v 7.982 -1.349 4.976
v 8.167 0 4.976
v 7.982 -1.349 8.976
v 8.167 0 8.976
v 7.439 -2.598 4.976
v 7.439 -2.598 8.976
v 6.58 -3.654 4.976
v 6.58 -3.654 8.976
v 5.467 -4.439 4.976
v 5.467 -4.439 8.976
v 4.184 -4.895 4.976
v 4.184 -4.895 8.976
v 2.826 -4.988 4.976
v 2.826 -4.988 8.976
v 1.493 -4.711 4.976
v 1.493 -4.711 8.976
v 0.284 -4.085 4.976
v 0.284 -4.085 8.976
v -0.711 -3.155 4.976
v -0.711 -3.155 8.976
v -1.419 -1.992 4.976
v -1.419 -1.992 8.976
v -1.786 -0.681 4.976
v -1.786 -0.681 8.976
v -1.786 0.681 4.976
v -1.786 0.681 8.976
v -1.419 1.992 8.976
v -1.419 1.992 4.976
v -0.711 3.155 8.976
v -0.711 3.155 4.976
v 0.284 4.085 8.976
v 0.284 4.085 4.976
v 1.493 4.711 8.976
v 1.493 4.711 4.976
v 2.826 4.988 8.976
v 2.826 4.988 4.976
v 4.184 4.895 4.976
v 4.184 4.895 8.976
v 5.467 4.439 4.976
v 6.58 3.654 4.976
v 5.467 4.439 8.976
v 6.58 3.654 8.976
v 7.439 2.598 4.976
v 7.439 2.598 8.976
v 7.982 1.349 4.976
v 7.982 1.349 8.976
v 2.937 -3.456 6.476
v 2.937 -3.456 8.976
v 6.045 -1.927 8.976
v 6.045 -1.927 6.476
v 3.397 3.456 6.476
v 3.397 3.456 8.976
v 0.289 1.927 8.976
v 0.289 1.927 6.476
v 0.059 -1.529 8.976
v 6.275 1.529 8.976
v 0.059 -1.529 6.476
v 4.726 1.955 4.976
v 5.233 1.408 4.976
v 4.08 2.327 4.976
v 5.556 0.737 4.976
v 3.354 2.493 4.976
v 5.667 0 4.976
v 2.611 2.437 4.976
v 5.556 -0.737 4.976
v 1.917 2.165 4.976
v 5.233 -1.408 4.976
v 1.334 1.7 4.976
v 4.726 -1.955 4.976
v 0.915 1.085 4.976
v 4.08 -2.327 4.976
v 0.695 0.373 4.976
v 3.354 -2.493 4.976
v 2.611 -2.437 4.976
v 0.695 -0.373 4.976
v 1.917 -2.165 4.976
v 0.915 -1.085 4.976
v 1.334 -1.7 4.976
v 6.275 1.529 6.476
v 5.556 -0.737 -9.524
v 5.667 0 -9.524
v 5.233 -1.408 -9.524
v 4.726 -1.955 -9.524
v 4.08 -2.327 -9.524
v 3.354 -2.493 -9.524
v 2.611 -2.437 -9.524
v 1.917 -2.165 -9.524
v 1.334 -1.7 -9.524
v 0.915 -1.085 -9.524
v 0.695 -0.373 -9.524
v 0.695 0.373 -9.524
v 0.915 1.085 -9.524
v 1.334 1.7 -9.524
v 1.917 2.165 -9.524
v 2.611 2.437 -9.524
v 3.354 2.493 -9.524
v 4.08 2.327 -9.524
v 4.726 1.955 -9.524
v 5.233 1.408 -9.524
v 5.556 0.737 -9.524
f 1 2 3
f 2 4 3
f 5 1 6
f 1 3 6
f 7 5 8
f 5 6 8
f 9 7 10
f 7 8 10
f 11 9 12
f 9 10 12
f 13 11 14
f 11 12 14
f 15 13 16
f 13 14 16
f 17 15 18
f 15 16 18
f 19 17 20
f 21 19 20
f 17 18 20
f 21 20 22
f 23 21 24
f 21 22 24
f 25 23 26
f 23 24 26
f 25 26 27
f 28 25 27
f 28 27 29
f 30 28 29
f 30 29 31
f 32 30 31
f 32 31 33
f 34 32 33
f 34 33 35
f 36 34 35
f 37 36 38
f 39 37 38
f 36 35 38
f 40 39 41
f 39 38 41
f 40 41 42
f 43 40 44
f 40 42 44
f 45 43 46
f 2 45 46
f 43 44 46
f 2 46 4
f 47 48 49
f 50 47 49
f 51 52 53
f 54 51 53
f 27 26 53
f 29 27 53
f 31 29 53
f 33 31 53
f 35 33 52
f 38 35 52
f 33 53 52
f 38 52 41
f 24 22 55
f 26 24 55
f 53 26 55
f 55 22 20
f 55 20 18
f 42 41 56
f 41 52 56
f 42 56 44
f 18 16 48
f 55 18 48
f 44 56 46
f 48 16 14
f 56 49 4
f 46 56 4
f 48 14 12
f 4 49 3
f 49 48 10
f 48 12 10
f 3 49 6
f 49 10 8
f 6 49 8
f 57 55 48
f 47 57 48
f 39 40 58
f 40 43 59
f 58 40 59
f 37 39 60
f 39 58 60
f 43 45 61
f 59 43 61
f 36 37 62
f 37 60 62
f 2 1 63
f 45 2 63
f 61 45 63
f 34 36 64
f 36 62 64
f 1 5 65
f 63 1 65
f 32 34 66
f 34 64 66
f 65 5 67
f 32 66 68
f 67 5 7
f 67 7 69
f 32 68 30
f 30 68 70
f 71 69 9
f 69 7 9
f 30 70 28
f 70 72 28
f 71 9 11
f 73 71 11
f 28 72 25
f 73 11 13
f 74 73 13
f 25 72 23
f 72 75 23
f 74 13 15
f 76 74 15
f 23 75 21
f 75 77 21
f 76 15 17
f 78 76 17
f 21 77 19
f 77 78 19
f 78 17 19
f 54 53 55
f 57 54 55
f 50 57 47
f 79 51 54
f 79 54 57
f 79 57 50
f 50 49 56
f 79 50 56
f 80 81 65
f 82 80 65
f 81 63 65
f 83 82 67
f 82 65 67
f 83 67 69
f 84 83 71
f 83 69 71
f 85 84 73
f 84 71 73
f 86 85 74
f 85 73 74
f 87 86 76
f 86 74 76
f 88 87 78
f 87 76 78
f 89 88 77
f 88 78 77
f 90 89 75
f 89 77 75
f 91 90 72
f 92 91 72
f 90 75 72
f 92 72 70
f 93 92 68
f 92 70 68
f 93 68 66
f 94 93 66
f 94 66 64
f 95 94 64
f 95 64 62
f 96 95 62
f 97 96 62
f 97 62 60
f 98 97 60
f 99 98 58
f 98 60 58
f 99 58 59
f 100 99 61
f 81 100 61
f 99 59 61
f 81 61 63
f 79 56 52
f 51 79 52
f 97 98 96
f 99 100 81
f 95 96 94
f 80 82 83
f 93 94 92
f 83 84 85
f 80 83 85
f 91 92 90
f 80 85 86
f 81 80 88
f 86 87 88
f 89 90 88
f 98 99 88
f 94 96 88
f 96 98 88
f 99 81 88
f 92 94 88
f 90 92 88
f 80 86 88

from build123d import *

# Parameters (mm, degrees)
F3_DEPTH = 2.5


with BuildPart() as f1:
    # F0 (on Front) → F1 (revolve)
    with BuildSketch(Plane.XZ):
        Polygon((5.667086, 8.976137), (3.167086, 8.976137), (3.167086, -9.523863), (5.667086, -9.523863), (5.667086, 4.976137), (8.167086, 4.976137), (8.167086, 8.976137), align=None)
    revolve(axis=Axis((3.167086, 0, 1.163182), (0, 0, -1)))

    # F2 (on face) → F3 (cut)
    with BuildSketch(Plane.XY.offset(8.976137)):
        Polygon((2.937124, -3.45646), (6.045487, -1.927383), (6.275449, 1.529077), (3.397048, 3.45646), (0.288685, 1.927383), (0.058723, -1.529077), align=None)
    extrude(amount=-F3_DEPTH, mode=Mode.SUBTRACT)


solid = f1.part
